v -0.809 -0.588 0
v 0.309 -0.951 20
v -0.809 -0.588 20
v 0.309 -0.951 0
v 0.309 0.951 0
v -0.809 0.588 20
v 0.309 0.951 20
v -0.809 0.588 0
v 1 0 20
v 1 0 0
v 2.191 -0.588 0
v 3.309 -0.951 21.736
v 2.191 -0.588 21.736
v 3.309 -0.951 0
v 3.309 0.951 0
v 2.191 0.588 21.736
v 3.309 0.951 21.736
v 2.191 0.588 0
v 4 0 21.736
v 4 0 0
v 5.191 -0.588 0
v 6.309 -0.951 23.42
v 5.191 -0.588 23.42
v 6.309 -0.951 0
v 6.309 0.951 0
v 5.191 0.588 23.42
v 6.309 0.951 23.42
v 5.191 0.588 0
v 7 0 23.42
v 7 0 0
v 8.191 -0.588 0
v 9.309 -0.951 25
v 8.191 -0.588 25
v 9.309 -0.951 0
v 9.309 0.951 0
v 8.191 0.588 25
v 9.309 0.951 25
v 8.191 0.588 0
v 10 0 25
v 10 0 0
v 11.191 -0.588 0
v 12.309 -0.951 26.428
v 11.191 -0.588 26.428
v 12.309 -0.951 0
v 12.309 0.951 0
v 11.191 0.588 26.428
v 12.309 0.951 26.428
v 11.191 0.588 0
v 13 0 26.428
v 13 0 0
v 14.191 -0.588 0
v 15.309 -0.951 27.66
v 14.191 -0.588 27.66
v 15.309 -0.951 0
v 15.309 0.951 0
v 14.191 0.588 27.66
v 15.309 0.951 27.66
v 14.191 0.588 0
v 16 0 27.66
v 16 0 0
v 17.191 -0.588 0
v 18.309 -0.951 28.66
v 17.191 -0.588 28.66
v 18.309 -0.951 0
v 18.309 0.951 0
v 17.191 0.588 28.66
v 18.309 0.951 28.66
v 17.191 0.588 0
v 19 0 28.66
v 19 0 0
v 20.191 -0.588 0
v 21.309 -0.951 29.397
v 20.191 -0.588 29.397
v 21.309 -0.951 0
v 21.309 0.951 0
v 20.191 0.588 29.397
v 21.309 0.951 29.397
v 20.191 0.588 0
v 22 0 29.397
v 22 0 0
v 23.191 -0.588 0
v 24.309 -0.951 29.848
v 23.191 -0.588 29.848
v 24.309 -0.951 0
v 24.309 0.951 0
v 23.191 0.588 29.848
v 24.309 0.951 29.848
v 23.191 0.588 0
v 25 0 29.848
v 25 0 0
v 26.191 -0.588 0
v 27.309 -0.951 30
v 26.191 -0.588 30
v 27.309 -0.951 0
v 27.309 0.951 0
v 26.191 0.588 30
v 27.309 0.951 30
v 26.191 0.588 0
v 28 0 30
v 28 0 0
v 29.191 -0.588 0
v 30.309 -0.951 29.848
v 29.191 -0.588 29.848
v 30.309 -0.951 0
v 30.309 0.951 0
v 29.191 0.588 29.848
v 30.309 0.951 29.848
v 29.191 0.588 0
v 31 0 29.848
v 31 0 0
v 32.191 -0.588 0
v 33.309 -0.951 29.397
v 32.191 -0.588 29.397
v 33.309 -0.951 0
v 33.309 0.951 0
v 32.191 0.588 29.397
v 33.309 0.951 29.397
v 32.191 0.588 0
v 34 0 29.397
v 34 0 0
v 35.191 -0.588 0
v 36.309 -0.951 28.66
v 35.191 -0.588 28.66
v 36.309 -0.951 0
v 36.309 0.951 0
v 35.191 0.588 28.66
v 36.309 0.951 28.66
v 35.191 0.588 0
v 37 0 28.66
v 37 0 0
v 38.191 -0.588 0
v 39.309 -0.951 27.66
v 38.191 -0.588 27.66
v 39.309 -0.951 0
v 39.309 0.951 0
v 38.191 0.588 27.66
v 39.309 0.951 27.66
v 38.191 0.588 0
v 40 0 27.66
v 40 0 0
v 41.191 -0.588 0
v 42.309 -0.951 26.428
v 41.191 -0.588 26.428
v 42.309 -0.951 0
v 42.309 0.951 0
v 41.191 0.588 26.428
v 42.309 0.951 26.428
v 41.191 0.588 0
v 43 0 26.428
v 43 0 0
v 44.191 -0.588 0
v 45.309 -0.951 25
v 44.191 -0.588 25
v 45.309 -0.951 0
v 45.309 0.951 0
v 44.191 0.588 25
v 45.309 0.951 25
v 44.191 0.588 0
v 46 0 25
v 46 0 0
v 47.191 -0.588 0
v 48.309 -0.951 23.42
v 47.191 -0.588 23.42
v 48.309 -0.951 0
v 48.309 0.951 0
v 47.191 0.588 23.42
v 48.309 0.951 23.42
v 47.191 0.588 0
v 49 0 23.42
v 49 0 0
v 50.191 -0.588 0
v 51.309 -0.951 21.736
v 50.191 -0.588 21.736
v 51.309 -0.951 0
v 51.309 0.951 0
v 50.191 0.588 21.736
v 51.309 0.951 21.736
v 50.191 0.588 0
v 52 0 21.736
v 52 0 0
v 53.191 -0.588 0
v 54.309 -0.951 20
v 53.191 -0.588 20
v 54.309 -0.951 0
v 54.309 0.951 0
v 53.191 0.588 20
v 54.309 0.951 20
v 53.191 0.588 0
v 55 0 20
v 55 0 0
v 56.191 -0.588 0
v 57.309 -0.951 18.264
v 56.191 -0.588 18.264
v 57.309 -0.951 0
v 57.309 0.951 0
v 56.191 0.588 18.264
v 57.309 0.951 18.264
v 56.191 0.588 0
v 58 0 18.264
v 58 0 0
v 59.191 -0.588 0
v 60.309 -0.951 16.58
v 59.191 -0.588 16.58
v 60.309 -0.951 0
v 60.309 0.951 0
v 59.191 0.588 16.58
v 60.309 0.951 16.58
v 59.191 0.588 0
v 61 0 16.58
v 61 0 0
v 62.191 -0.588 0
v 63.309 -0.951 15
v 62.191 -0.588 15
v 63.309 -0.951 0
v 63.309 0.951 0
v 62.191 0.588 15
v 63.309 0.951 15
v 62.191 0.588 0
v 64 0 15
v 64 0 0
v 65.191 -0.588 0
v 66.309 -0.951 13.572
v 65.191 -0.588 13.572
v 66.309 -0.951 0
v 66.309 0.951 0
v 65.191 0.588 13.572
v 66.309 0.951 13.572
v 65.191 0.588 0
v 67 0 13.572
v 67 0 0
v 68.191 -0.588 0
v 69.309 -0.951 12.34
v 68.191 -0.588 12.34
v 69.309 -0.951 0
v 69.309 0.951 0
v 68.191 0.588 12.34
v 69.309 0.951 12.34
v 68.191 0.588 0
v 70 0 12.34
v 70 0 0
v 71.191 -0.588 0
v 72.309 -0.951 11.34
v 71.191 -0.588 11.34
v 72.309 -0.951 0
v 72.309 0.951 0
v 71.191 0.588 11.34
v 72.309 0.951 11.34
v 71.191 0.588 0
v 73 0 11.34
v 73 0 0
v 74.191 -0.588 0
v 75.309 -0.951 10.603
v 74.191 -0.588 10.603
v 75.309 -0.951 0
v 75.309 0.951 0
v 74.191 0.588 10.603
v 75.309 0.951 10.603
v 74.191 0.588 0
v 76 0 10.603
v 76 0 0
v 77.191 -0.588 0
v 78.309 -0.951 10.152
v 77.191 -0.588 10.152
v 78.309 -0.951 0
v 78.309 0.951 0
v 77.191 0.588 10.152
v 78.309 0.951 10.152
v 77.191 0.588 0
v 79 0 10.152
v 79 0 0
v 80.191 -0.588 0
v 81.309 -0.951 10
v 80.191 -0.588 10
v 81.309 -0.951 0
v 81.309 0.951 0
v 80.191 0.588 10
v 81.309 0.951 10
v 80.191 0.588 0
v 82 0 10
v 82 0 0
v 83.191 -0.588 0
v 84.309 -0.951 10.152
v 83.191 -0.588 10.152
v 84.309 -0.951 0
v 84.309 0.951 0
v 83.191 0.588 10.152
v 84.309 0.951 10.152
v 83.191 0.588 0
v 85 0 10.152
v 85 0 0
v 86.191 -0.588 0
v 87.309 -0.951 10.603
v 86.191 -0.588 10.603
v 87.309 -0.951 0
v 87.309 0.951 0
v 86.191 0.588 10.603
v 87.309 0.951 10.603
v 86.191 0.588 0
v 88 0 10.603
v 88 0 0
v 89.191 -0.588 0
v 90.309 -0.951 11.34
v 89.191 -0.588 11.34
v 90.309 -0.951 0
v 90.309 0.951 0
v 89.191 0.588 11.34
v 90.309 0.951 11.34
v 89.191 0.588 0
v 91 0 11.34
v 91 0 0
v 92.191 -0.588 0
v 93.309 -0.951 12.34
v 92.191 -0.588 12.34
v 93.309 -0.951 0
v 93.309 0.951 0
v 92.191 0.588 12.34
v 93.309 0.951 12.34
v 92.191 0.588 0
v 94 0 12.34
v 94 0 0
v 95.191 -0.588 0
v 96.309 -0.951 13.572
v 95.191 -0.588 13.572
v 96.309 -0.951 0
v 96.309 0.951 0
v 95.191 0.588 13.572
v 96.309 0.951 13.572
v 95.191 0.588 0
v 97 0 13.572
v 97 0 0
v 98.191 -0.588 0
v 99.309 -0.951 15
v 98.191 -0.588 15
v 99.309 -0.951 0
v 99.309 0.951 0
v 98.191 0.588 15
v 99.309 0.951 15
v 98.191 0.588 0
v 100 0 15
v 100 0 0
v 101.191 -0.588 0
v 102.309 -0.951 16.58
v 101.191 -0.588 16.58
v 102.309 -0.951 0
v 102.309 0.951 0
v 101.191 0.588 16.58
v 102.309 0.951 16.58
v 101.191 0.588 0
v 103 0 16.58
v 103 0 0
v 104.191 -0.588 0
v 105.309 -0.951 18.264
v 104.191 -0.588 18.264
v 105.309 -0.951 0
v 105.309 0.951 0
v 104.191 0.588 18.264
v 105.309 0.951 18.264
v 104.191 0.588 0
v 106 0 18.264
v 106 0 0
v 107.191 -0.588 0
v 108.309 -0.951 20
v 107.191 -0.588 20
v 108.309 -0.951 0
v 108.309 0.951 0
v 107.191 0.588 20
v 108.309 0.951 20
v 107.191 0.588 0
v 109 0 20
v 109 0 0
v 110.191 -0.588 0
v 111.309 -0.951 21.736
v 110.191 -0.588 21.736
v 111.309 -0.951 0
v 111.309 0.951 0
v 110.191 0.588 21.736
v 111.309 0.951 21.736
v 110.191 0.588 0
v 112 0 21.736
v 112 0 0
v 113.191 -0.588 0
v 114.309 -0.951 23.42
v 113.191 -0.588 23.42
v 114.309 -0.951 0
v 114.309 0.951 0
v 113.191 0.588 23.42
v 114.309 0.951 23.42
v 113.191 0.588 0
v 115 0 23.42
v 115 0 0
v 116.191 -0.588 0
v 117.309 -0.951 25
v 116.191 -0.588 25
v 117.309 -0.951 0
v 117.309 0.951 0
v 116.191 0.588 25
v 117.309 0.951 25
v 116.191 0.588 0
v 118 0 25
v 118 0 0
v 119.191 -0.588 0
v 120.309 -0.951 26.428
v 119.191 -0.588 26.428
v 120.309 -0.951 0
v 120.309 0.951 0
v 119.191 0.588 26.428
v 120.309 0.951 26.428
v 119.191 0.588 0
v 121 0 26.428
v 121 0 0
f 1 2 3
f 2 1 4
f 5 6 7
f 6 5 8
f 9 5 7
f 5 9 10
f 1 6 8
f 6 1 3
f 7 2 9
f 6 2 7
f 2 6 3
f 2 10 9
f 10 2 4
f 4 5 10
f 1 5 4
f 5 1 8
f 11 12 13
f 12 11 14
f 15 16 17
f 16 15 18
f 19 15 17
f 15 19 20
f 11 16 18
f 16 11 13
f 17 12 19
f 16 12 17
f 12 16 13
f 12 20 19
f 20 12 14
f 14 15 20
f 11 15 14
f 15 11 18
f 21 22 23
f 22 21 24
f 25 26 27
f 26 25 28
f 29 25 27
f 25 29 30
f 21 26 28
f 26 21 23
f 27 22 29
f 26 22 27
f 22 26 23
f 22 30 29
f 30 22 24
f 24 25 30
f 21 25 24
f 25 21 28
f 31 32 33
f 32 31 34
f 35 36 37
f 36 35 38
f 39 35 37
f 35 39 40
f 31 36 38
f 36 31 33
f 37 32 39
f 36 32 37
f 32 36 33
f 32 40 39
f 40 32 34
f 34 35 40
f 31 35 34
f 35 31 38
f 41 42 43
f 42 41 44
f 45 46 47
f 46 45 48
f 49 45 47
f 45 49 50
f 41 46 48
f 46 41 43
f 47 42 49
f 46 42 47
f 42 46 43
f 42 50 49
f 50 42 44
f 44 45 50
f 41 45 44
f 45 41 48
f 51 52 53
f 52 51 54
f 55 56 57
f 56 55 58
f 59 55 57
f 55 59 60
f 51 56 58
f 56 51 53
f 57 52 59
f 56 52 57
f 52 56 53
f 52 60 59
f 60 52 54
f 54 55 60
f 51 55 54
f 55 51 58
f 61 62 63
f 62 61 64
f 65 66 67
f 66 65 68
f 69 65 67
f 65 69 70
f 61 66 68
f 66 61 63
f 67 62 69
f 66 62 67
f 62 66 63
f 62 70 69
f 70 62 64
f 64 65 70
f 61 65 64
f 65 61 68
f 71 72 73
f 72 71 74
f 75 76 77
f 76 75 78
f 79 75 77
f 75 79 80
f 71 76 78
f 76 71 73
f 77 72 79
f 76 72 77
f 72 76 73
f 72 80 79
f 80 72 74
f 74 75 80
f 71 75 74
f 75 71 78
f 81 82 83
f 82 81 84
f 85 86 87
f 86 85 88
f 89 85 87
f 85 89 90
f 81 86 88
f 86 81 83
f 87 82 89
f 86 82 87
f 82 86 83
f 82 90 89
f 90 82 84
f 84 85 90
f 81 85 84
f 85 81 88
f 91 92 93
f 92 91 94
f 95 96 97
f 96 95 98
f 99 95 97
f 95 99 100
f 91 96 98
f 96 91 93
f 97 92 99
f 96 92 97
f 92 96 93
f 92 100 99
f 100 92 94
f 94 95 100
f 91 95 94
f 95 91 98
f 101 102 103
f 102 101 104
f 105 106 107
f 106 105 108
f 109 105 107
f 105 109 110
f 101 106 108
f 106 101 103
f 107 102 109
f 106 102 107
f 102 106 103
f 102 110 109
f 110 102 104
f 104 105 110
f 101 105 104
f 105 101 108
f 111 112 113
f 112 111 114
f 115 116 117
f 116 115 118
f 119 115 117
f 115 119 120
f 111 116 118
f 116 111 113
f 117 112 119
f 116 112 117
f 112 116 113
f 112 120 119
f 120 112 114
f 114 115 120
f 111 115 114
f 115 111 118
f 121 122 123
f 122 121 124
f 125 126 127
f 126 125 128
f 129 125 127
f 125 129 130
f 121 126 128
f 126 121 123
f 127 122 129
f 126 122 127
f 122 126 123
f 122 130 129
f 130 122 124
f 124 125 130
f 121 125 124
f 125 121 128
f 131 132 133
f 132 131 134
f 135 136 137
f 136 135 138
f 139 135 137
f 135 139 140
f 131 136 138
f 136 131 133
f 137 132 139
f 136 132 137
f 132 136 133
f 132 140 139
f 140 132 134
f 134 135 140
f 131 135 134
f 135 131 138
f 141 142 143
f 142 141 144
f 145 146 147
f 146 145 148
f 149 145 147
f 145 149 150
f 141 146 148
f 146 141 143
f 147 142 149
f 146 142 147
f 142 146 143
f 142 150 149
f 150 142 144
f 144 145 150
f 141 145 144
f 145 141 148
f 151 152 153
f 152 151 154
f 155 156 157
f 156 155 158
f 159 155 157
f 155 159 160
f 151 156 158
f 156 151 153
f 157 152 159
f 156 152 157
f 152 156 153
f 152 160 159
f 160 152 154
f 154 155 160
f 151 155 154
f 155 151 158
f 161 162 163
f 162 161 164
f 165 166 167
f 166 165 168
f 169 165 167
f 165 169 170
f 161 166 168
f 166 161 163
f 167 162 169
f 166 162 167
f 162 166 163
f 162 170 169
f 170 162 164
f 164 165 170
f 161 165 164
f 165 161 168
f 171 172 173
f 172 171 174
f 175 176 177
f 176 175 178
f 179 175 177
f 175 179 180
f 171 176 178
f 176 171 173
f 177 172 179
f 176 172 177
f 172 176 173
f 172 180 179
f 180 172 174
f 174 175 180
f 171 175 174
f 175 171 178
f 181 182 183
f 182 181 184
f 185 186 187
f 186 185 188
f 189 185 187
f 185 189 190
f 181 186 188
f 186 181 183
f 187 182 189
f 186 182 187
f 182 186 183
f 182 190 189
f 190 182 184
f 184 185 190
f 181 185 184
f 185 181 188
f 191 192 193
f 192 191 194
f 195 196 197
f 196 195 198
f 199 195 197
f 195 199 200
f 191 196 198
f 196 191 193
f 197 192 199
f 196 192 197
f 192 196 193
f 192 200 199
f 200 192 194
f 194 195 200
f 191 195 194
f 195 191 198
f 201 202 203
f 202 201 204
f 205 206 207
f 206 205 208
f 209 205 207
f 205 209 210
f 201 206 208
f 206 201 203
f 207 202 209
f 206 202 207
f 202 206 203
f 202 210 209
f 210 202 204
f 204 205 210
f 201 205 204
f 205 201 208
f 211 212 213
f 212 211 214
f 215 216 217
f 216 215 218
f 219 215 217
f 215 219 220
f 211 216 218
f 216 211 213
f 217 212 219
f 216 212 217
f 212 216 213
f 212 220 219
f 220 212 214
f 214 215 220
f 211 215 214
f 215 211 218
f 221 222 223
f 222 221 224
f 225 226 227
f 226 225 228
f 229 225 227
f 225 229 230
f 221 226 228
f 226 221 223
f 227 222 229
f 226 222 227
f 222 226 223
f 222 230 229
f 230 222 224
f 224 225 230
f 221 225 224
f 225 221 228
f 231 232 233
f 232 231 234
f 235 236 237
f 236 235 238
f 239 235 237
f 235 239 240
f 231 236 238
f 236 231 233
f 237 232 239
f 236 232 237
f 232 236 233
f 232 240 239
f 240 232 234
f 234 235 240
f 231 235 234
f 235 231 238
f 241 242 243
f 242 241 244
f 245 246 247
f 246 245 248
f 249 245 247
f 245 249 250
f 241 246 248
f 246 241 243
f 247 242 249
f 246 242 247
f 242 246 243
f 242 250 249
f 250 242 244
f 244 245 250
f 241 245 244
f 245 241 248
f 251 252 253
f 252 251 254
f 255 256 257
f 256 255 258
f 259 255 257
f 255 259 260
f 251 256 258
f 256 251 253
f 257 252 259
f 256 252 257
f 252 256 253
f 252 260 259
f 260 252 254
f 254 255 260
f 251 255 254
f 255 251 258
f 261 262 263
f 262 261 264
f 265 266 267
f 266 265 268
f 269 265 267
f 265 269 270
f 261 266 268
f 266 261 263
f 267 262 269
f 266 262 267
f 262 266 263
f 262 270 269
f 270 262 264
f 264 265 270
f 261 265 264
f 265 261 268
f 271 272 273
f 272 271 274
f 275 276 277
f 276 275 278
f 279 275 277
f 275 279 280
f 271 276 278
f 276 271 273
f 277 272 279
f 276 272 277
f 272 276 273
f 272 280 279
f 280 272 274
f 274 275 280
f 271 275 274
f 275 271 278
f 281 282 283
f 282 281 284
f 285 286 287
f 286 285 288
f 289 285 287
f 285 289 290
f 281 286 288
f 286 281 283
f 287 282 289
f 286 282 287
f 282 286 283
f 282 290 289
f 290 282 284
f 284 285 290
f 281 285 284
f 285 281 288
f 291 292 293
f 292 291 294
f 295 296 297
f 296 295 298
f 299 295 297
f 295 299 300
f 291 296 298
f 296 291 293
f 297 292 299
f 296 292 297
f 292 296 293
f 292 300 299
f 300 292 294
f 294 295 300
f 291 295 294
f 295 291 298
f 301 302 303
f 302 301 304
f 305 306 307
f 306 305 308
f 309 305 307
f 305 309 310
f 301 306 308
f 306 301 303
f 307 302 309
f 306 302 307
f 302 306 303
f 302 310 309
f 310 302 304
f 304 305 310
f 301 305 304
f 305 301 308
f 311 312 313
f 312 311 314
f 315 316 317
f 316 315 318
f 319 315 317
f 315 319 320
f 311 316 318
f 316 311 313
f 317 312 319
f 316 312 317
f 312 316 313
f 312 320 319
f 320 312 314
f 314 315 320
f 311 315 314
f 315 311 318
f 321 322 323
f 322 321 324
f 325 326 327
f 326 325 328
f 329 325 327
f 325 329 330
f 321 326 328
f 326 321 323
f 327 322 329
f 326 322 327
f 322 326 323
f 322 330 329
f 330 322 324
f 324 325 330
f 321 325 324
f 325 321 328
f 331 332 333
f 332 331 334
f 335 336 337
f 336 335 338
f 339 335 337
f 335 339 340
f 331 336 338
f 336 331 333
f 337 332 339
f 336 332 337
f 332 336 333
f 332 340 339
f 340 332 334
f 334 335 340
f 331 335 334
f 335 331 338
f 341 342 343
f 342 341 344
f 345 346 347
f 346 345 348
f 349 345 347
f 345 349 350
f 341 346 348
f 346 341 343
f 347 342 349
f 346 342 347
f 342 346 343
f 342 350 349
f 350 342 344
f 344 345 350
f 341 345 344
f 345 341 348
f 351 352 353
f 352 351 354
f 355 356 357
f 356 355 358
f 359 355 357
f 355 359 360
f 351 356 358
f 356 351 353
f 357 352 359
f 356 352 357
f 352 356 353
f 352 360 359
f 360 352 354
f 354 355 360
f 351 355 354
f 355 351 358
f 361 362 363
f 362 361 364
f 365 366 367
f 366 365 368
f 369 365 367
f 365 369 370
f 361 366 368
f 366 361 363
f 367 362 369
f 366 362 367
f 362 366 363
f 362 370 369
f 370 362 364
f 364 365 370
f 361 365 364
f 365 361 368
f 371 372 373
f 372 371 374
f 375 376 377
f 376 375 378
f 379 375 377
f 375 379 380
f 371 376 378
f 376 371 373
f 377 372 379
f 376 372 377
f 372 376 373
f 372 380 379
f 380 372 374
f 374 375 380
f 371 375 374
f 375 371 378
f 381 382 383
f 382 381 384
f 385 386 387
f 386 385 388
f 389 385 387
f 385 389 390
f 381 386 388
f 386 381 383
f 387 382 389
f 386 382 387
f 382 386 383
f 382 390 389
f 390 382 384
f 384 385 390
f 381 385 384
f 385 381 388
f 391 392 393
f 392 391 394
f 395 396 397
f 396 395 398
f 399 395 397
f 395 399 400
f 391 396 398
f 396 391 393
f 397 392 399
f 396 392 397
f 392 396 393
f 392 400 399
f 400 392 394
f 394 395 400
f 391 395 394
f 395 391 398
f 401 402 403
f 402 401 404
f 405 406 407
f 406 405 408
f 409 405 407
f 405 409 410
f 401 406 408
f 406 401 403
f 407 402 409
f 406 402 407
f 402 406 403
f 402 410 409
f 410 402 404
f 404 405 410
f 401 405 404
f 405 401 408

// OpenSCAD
// file: utils/build_plate.scad
// Build Plate representation module
// Made by Makerbot (http://curriculum.makerbot.com/daily_lessons/february/openscad_buildplate.html)

//use this to include a build plate visualization in your openSCAD scripts. Very useful for things designed to be edited in Makerbot Customizer

//to use, either include or use <utils/build_plate.scad>

//then just call build_plate(); with the following arguments (also, you have to have a real object in your scene for this to render)

//putting 0 as the first argument will give you a Replicator 2 build plate
//putting 1 as the first argument will give you a Replicator 1 build plate
//putting 2 as the first argument will give you a Thingomatic build plate
//putting 3 as the first argument will give you a manually adjustable build plate (note: if you use this option, you need to specify your build plates X length (in mm) as the second argument and the Y length (in mm) as the third argument. eg. build_plate(3,150,120);)

/*

to give your user control of which build plate they see in Customizer, include the following code:

use <utils/build_plate.scad>

//for display only, doesn't contribute to final object
build_plate_selector = 0; //[0:Replicator 2,1: Replicator,2:Thingomatic,3:Manual]
//when Build Plate Selector is set to "manual" this controls the build plate x dimension
build_plate_manual_x = 100; //[100:400]
//when Build Plate Selector is set to "manual" this controls the build plate y dimension
build_plate_manual_y = 100; //[100:400]

build_plate(build_plate_selector,build_plate_manual_x,build_plate_manual_y);

*/




//to see how this works, uncomment the following code

//build_plate_selector = 0; //[0:Replicator 2,1: Replicator,2:Thingomatic,3:Manual]
//build_plate_manual_x = 100; //[100:400]
//build_plate_manual_y = 100; //[100:400]
//
//build_plate(build_plate_selector,build_plate_manual_x,build_plate_manual_y);
//
//cube(5);


module build_plate(bp,manX,manY){

		translate([0,0,-.52]){
			if(bp == 0){
				%cube([285,153,1],center = true);
			}
			if(bp == 1){
				%cube([225,145,1],center = true);
			}
			if(bp == 2){
				%cube([120,120,1],center = true);
			}
			if(bp == 3){
				%cube([manX,manY,1],center = true);
			}
		
		}
		translate([0,0,-.5]){
			if(bp == 0){
				for(i = [-14:14]){
					translate([i*10,0,0])
					%cube([.5,153,1.01],center = true);
				}
				for(i = [-7:7]){
					translate([0,i*10,0])
					%cube([285,.5,1.01],center = true);
				}	
			}
			if(bp == 1){
				for(i = [-11:11]){
					translate([i*10,0,0])
						%cube([.5,145,1.01],center = true);
				}
				for(i = [-7:7]){
					translate([0,i*10,0])
						%cube([225,.5,1.01],center = true);
				}
			}
			if(bp == 2){
				for(i = [-6:6]){
					translate([i*10,0,0])
						%cube([.5,120,1.01],center = true);
				}
				for(i = [-6:6]){
					translate([0,i*10,0])
						%cube([120,.5,1.01],center = true);
				}
			}
			if(bp == 3){
				for(i = [-(floor(manX/20)):floor(manX/20)]){
					translate([i*10,0,0])
						%cube([.5,manY,1.01],center = true);
				}
				for(i = [-(floor(manY/20)):floor(manY/20)]){
					translate([0,i*10,0])
						%cube([manX,.5,1.01],center = true);
				}
			}
		}
}
// main file
use <./utils/build_plate.scad> // Cuadricula transparente para la base
build_plate(3, 200,100); // No se incluye al renderizar


for(k=[0:40]){
	translate([3*k,0,0])
		cylinder(r=1,h=10*(sin(k*10)+2));
}
